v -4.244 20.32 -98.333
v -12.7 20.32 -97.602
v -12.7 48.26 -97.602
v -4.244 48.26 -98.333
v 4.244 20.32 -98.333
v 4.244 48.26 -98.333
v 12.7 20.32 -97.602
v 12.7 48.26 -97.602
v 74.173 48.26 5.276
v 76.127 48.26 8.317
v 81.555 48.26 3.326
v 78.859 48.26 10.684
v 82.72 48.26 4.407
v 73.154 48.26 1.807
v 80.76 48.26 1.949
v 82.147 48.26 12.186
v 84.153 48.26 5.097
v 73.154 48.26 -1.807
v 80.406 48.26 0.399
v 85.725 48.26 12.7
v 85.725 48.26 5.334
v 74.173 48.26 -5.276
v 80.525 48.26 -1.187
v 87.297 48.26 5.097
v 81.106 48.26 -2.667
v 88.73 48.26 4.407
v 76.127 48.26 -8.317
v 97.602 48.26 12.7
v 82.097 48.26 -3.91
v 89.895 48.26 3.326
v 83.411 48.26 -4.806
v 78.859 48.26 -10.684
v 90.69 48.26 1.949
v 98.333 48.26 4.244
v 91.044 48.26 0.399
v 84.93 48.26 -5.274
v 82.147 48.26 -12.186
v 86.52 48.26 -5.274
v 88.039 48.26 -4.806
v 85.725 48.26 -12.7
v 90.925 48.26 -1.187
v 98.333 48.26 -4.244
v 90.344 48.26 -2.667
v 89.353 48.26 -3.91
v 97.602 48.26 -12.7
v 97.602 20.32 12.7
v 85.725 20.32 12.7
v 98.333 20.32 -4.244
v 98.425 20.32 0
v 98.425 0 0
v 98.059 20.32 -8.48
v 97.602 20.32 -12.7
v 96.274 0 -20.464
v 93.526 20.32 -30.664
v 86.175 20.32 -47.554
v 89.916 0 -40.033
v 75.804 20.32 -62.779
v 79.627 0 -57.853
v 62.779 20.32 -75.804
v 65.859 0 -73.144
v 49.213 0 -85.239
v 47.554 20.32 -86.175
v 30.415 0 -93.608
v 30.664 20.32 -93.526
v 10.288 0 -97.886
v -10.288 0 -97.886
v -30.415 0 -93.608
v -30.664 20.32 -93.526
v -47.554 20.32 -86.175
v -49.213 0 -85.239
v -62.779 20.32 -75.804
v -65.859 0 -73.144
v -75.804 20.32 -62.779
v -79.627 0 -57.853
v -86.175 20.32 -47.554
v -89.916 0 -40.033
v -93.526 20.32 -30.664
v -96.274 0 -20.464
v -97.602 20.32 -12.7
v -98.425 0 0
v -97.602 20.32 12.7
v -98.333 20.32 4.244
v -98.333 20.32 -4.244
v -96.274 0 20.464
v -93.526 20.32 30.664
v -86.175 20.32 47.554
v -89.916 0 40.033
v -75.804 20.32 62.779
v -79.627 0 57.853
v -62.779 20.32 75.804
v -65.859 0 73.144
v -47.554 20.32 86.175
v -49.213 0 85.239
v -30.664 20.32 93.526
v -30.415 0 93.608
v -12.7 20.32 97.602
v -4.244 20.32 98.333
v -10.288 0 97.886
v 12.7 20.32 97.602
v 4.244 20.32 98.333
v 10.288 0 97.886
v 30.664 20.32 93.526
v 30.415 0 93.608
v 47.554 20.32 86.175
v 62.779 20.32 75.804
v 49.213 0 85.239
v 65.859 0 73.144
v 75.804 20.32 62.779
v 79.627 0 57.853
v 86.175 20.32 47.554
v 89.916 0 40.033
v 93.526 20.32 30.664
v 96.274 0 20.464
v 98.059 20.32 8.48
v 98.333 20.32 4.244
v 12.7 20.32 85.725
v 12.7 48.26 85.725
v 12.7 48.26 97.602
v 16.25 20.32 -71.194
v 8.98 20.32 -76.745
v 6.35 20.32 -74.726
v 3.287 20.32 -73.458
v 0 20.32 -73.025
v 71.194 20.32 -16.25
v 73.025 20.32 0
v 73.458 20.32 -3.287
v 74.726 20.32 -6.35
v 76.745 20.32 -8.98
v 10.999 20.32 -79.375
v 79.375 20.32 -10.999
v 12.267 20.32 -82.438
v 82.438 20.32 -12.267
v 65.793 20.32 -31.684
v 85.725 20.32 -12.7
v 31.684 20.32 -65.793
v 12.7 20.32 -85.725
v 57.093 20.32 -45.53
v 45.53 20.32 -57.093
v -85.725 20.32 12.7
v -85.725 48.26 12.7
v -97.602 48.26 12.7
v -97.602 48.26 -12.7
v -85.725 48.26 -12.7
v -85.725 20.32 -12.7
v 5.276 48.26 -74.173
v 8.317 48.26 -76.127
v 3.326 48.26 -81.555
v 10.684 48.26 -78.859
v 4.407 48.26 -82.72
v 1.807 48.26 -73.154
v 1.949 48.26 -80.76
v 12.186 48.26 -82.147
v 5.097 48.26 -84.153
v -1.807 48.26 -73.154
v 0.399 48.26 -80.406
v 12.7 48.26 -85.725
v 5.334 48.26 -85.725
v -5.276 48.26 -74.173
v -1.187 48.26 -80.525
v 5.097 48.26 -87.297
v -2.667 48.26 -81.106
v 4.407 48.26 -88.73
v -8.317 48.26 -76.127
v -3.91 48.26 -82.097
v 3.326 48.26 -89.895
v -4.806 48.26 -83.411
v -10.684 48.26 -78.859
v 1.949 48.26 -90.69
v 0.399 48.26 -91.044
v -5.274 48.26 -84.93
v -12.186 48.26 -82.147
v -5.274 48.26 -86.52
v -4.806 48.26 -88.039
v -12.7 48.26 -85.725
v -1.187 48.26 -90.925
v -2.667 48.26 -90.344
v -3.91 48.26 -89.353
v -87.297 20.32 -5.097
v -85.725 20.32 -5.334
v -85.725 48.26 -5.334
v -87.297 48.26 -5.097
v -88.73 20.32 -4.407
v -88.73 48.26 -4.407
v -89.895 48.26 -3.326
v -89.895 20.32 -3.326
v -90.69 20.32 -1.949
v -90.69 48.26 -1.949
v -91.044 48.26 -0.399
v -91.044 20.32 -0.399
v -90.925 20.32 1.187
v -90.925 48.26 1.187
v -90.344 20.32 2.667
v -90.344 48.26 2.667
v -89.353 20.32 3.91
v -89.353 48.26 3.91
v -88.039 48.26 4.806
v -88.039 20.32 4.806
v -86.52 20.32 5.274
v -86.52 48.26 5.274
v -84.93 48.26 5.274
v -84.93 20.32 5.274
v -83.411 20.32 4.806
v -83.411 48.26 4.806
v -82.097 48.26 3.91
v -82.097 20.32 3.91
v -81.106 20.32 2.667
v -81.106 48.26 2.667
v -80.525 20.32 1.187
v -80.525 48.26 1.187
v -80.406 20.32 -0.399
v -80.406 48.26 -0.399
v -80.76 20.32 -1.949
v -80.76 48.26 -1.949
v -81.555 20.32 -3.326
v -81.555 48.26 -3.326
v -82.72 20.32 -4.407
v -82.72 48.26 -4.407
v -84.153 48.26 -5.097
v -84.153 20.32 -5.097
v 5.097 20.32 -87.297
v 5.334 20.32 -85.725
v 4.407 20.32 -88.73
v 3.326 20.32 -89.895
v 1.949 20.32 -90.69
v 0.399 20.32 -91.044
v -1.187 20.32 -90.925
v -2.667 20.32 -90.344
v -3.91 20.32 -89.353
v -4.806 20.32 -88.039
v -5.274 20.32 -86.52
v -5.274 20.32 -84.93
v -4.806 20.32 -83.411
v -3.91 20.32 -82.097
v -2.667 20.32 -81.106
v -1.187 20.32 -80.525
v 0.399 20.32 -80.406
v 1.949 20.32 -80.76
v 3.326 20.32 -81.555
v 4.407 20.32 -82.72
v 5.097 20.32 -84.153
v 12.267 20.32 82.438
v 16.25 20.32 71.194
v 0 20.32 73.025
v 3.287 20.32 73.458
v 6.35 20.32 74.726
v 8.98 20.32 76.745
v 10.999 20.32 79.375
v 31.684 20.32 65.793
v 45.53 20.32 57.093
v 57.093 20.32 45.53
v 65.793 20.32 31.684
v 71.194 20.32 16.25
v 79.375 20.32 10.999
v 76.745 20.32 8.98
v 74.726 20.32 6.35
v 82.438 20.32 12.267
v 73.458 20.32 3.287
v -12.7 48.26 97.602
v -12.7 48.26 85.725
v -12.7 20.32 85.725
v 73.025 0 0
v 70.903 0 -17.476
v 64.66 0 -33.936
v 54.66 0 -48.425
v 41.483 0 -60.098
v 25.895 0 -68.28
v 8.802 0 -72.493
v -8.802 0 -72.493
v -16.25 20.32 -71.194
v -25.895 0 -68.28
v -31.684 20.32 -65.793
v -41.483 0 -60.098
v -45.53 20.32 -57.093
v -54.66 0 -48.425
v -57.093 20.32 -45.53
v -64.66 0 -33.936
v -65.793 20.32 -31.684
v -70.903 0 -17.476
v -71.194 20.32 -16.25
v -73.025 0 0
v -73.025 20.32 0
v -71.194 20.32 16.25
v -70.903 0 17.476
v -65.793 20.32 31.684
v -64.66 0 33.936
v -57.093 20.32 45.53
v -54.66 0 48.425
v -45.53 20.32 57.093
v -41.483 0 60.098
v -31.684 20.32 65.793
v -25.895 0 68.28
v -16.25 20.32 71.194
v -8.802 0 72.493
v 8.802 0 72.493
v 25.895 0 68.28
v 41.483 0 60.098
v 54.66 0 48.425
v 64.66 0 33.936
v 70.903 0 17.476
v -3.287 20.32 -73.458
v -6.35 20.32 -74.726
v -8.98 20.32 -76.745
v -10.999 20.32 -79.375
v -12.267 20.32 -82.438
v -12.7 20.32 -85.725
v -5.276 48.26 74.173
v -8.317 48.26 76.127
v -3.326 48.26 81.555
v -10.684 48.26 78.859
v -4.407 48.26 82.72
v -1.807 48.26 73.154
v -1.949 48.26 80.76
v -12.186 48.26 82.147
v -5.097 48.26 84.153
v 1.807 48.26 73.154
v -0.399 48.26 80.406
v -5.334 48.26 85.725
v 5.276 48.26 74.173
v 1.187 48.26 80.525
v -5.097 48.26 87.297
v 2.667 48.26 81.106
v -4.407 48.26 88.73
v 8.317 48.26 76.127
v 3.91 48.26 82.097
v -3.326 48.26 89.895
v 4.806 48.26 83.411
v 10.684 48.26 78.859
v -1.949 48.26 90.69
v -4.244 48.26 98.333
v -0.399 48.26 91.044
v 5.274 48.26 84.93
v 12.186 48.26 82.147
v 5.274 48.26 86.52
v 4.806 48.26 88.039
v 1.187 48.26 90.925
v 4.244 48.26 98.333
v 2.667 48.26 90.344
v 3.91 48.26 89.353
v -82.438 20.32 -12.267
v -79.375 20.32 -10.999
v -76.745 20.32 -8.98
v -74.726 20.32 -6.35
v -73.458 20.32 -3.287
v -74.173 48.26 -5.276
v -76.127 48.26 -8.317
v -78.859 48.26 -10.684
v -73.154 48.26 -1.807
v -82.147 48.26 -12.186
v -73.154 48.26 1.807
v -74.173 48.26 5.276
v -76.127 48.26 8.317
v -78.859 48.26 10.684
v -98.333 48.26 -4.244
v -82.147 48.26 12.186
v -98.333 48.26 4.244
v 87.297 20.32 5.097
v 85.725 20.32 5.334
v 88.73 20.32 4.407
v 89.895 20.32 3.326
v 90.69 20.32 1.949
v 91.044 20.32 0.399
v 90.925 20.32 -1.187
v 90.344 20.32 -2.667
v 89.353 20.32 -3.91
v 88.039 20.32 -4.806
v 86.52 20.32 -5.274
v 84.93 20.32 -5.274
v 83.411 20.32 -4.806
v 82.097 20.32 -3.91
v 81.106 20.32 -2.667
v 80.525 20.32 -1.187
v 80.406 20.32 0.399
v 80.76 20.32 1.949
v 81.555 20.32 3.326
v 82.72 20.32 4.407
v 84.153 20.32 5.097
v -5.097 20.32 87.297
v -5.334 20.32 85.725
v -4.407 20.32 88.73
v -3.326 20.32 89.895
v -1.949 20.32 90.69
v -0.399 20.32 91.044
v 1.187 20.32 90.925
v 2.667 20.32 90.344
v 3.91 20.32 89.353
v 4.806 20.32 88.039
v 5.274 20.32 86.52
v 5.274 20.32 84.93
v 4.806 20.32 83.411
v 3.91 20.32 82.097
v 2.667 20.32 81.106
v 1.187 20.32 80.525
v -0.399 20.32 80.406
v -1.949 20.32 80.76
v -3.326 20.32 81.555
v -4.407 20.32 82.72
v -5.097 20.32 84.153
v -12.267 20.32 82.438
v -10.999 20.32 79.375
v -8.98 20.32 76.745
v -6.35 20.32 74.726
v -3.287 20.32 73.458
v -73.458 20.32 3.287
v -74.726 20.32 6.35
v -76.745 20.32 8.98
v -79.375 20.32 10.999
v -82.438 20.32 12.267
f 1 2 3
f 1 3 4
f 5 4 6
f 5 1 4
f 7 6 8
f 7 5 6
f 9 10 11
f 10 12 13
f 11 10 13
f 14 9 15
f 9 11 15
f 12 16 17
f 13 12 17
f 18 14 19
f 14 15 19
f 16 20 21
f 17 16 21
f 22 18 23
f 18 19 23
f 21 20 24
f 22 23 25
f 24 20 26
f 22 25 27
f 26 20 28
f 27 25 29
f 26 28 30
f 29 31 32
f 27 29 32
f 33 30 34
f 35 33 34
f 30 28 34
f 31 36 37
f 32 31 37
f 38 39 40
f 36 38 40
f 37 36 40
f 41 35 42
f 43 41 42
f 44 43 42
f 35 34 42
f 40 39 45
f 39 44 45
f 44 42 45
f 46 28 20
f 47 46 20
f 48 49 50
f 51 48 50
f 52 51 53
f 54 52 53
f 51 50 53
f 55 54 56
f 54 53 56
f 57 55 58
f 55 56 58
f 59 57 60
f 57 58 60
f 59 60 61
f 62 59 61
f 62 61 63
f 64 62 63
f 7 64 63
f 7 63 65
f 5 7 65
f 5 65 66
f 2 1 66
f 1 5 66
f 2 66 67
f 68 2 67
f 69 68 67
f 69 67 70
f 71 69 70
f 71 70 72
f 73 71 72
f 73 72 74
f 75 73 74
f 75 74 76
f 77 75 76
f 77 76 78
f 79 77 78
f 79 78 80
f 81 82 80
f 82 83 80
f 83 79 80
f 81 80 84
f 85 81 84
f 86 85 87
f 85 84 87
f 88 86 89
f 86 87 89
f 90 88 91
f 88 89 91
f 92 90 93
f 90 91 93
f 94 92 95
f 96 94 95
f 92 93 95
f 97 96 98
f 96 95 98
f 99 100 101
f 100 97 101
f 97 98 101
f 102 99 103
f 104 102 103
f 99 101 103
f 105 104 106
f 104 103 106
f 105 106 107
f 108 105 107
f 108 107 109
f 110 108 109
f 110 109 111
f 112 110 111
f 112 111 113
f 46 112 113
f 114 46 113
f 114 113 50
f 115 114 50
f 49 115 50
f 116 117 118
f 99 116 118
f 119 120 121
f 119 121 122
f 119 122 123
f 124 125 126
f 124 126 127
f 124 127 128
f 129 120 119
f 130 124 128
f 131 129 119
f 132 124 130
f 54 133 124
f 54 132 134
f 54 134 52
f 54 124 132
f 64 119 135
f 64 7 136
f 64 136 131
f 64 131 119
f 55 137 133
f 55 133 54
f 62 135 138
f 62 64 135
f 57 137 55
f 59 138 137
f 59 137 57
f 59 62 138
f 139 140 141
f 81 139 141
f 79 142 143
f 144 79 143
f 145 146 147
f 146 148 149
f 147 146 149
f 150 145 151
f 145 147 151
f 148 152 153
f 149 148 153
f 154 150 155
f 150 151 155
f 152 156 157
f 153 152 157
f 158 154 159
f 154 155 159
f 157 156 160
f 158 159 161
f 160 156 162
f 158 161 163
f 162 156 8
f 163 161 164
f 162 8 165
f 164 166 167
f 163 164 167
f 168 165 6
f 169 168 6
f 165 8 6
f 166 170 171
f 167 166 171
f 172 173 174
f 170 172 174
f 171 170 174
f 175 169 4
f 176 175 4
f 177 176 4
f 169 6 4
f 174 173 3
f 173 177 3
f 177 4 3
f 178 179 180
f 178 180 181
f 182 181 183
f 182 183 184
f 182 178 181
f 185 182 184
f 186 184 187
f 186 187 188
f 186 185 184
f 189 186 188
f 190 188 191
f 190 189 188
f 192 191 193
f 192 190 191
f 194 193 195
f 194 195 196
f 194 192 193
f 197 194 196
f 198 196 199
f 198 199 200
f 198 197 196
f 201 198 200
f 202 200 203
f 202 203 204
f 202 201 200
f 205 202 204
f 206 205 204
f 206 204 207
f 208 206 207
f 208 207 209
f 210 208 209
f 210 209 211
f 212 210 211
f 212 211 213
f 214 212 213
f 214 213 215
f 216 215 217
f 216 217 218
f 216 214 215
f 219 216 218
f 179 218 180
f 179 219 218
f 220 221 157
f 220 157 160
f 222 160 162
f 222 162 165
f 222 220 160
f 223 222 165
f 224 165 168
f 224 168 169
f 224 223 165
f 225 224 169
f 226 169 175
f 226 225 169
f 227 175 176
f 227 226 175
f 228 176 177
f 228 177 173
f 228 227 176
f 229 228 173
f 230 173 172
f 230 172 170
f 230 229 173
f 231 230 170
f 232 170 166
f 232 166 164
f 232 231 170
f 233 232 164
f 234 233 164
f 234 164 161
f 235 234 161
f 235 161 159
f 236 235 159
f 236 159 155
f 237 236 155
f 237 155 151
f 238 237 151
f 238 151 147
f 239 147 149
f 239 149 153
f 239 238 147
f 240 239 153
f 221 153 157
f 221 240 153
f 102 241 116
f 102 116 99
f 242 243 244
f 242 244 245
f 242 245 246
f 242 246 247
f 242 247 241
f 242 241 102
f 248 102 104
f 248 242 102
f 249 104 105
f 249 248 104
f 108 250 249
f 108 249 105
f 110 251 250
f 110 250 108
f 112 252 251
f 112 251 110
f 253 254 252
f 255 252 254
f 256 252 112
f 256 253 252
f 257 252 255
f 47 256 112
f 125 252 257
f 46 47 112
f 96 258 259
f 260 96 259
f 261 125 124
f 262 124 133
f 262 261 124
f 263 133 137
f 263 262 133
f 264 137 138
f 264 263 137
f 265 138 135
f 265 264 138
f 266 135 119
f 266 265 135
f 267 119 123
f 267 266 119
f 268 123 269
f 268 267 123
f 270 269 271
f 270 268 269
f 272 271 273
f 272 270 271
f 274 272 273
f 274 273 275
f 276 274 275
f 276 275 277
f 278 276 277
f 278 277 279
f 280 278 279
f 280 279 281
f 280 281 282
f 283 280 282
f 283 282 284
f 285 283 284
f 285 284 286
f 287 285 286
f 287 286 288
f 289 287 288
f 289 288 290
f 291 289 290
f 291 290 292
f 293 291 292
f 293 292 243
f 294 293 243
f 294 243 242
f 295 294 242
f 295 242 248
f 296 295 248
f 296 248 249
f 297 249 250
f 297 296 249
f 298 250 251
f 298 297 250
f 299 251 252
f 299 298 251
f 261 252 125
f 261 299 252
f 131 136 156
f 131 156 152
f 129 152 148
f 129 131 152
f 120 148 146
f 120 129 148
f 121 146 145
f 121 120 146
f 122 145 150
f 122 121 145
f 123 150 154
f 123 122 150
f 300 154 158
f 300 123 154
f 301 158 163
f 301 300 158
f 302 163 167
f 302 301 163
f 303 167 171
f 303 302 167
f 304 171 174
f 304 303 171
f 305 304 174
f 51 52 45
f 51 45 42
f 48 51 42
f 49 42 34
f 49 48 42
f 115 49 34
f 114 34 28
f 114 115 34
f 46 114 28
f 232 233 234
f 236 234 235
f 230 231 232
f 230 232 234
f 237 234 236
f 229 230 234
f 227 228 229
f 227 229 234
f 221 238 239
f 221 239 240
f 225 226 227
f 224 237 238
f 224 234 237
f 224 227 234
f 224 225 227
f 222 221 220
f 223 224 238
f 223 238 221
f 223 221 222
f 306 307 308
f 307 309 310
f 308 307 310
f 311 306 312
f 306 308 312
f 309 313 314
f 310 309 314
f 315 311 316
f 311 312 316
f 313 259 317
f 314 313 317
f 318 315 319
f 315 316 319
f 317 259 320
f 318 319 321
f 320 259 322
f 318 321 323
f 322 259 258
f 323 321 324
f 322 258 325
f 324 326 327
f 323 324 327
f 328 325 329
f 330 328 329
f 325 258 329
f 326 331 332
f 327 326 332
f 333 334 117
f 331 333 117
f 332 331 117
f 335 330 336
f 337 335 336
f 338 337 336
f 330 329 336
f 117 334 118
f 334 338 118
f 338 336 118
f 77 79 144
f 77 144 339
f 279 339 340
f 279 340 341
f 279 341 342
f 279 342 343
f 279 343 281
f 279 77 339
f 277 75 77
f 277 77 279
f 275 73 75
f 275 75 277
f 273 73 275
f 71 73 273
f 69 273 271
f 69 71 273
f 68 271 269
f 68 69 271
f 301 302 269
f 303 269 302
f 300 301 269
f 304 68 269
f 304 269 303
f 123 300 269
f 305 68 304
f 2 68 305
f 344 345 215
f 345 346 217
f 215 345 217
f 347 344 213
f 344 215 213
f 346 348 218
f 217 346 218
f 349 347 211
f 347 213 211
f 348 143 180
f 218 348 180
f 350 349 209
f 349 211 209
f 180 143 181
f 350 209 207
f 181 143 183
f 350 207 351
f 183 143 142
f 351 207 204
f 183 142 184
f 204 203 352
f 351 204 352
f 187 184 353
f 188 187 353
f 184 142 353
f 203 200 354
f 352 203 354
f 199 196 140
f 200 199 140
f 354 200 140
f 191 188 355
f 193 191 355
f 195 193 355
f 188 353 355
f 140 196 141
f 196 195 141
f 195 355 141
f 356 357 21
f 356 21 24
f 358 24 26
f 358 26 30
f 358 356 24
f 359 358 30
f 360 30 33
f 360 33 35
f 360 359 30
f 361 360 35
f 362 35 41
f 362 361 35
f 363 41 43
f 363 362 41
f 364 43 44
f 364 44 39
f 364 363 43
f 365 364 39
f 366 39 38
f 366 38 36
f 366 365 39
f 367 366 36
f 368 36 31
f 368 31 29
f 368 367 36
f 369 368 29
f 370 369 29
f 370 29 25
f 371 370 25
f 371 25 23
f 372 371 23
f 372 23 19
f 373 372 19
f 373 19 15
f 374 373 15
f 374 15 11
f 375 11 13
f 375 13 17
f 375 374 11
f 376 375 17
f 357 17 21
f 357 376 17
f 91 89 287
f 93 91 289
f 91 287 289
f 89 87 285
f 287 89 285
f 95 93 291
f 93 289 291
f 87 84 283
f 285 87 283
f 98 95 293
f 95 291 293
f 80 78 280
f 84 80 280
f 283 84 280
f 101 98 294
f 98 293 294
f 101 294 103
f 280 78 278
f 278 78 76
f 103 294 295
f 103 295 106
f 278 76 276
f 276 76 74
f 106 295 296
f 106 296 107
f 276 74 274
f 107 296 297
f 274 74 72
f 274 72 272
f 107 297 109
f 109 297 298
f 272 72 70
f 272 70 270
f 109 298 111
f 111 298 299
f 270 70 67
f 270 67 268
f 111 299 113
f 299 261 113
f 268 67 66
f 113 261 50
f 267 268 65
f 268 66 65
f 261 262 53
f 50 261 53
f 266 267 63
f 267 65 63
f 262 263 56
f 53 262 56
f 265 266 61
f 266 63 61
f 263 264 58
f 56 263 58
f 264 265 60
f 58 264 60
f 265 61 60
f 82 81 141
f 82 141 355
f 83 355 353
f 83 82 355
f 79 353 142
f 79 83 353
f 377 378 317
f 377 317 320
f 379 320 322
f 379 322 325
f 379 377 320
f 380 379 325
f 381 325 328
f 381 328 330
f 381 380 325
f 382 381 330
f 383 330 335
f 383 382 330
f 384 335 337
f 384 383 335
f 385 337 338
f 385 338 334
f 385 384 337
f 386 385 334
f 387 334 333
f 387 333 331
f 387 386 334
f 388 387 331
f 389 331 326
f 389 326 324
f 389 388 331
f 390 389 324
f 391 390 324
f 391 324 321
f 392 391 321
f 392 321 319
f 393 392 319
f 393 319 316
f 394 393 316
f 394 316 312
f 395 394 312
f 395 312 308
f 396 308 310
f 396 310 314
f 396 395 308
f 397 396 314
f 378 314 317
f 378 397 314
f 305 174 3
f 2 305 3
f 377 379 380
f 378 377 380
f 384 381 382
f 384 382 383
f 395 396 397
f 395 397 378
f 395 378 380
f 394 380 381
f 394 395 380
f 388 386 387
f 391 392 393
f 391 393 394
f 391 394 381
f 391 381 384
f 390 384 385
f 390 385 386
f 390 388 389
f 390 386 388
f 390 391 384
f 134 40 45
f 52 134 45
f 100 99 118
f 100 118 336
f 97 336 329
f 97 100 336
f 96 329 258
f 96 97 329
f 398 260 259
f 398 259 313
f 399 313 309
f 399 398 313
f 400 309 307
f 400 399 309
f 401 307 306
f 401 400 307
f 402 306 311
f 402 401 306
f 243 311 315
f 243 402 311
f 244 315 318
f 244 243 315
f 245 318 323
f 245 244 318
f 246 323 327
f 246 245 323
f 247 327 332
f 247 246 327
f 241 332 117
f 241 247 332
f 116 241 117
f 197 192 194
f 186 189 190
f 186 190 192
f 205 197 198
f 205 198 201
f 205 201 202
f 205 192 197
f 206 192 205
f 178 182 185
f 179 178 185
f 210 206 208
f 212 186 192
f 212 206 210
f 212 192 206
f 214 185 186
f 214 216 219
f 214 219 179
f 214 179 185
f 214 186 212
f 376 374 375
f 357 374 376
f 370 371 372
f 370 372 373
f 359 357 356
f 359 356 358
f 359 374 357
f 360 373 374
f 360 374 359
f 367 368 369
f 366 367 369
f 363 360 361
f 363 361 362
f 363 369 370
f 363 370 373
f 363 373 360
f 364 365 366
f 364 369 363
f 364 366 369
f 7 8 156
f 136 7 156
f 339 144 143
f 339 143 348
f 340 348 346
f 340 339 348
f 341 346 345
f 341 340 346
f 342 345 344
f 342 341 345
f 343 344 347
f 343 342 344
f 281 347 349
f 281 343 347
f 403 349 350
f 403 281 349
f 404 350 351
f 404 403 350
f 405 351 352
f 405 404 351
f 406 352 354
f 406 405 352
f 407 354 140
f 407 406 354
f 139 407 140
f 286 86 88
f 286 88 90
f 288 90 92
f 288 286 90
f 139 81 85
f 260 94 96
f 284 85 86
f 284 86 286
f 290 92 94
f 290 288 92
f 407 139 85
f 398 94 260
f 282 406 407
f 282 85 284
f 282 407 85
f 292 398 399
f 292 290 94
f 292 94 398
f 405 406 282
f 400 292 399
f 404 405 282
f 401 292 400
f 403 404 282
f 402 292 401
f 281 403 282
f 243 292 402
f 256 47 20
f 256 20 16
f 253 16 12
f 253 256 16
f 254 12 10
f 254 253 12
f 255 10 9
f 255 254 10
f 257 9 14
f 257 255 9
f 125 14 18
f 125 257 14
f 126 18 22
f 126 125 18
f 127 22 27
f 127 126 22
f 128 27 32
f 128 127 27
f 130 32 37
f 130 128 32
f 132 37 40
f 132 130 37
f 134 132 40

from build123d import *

# Parameters (mm, degrees)
SKETCH1_R           = 98.425
SKETCH1_R_2         = 73.025
BOSS_EXTRUDE1_DEPTH = 20.32
SKETCH9_R           = 5.334
BOSS_EXTRUDE6_DEPTH = 27.94
CIRPATTERN5_COUNT   = 4


with BuildPart() as part:
    # Sketch1 → Boss-Extrude1 (new body)
    with BuildSketch(Plane(origin=(0, 0, 0), x_dir=(1, 0, 0), z_dir=(0, 1, 0))):
        Circle(SKETCH1_R)
        Circle(SKETCH1_R_2, mode=Mode.SUBTRACT)
    extrude(amount=BOSS_EXTRUDE1_DEPTH)

    # Sketch9 → Boss-Extrude6 (add)
    with BuildSketch(Plane(origin=(0, 20.32, 0), x_dir=(1, 0, 0), z_dir=(0, 1, 0))):
        with BuildLine():
            Line((-12.7, 85.725), (-12.7, 97.602206046))
            ThreePointArc((-12.7, 97.602206046), (0, 98.425), (12.7, 97.602206046))
            Line((12.7, 97.602206046), (12.7, 85.725))
            ThreePointArc((12.7, 85.725), (0, 73.025), (-12.7, 85.725))
        make_face()
        with Locations((0, 85.725)):
            Circle(SKETCH9_R, mode=Mode.SUBTRACT)
    boss_extrude6 = extrude(amount=BOSS_EXTRUDE6_DEPTH)

    # CirPattern5: Boss-Extrude6 ×4 about axis
    cirpattern5_axis = Axis((0, 0, 0), (0, 1, 0))
    for i in range(1, CIRPATTERN5_COUNT):
        add(boss_extrude6.rotate(cirpattern5_axis, i * 360 / CIRPATTERN5_COUNT))


solid = part.part
